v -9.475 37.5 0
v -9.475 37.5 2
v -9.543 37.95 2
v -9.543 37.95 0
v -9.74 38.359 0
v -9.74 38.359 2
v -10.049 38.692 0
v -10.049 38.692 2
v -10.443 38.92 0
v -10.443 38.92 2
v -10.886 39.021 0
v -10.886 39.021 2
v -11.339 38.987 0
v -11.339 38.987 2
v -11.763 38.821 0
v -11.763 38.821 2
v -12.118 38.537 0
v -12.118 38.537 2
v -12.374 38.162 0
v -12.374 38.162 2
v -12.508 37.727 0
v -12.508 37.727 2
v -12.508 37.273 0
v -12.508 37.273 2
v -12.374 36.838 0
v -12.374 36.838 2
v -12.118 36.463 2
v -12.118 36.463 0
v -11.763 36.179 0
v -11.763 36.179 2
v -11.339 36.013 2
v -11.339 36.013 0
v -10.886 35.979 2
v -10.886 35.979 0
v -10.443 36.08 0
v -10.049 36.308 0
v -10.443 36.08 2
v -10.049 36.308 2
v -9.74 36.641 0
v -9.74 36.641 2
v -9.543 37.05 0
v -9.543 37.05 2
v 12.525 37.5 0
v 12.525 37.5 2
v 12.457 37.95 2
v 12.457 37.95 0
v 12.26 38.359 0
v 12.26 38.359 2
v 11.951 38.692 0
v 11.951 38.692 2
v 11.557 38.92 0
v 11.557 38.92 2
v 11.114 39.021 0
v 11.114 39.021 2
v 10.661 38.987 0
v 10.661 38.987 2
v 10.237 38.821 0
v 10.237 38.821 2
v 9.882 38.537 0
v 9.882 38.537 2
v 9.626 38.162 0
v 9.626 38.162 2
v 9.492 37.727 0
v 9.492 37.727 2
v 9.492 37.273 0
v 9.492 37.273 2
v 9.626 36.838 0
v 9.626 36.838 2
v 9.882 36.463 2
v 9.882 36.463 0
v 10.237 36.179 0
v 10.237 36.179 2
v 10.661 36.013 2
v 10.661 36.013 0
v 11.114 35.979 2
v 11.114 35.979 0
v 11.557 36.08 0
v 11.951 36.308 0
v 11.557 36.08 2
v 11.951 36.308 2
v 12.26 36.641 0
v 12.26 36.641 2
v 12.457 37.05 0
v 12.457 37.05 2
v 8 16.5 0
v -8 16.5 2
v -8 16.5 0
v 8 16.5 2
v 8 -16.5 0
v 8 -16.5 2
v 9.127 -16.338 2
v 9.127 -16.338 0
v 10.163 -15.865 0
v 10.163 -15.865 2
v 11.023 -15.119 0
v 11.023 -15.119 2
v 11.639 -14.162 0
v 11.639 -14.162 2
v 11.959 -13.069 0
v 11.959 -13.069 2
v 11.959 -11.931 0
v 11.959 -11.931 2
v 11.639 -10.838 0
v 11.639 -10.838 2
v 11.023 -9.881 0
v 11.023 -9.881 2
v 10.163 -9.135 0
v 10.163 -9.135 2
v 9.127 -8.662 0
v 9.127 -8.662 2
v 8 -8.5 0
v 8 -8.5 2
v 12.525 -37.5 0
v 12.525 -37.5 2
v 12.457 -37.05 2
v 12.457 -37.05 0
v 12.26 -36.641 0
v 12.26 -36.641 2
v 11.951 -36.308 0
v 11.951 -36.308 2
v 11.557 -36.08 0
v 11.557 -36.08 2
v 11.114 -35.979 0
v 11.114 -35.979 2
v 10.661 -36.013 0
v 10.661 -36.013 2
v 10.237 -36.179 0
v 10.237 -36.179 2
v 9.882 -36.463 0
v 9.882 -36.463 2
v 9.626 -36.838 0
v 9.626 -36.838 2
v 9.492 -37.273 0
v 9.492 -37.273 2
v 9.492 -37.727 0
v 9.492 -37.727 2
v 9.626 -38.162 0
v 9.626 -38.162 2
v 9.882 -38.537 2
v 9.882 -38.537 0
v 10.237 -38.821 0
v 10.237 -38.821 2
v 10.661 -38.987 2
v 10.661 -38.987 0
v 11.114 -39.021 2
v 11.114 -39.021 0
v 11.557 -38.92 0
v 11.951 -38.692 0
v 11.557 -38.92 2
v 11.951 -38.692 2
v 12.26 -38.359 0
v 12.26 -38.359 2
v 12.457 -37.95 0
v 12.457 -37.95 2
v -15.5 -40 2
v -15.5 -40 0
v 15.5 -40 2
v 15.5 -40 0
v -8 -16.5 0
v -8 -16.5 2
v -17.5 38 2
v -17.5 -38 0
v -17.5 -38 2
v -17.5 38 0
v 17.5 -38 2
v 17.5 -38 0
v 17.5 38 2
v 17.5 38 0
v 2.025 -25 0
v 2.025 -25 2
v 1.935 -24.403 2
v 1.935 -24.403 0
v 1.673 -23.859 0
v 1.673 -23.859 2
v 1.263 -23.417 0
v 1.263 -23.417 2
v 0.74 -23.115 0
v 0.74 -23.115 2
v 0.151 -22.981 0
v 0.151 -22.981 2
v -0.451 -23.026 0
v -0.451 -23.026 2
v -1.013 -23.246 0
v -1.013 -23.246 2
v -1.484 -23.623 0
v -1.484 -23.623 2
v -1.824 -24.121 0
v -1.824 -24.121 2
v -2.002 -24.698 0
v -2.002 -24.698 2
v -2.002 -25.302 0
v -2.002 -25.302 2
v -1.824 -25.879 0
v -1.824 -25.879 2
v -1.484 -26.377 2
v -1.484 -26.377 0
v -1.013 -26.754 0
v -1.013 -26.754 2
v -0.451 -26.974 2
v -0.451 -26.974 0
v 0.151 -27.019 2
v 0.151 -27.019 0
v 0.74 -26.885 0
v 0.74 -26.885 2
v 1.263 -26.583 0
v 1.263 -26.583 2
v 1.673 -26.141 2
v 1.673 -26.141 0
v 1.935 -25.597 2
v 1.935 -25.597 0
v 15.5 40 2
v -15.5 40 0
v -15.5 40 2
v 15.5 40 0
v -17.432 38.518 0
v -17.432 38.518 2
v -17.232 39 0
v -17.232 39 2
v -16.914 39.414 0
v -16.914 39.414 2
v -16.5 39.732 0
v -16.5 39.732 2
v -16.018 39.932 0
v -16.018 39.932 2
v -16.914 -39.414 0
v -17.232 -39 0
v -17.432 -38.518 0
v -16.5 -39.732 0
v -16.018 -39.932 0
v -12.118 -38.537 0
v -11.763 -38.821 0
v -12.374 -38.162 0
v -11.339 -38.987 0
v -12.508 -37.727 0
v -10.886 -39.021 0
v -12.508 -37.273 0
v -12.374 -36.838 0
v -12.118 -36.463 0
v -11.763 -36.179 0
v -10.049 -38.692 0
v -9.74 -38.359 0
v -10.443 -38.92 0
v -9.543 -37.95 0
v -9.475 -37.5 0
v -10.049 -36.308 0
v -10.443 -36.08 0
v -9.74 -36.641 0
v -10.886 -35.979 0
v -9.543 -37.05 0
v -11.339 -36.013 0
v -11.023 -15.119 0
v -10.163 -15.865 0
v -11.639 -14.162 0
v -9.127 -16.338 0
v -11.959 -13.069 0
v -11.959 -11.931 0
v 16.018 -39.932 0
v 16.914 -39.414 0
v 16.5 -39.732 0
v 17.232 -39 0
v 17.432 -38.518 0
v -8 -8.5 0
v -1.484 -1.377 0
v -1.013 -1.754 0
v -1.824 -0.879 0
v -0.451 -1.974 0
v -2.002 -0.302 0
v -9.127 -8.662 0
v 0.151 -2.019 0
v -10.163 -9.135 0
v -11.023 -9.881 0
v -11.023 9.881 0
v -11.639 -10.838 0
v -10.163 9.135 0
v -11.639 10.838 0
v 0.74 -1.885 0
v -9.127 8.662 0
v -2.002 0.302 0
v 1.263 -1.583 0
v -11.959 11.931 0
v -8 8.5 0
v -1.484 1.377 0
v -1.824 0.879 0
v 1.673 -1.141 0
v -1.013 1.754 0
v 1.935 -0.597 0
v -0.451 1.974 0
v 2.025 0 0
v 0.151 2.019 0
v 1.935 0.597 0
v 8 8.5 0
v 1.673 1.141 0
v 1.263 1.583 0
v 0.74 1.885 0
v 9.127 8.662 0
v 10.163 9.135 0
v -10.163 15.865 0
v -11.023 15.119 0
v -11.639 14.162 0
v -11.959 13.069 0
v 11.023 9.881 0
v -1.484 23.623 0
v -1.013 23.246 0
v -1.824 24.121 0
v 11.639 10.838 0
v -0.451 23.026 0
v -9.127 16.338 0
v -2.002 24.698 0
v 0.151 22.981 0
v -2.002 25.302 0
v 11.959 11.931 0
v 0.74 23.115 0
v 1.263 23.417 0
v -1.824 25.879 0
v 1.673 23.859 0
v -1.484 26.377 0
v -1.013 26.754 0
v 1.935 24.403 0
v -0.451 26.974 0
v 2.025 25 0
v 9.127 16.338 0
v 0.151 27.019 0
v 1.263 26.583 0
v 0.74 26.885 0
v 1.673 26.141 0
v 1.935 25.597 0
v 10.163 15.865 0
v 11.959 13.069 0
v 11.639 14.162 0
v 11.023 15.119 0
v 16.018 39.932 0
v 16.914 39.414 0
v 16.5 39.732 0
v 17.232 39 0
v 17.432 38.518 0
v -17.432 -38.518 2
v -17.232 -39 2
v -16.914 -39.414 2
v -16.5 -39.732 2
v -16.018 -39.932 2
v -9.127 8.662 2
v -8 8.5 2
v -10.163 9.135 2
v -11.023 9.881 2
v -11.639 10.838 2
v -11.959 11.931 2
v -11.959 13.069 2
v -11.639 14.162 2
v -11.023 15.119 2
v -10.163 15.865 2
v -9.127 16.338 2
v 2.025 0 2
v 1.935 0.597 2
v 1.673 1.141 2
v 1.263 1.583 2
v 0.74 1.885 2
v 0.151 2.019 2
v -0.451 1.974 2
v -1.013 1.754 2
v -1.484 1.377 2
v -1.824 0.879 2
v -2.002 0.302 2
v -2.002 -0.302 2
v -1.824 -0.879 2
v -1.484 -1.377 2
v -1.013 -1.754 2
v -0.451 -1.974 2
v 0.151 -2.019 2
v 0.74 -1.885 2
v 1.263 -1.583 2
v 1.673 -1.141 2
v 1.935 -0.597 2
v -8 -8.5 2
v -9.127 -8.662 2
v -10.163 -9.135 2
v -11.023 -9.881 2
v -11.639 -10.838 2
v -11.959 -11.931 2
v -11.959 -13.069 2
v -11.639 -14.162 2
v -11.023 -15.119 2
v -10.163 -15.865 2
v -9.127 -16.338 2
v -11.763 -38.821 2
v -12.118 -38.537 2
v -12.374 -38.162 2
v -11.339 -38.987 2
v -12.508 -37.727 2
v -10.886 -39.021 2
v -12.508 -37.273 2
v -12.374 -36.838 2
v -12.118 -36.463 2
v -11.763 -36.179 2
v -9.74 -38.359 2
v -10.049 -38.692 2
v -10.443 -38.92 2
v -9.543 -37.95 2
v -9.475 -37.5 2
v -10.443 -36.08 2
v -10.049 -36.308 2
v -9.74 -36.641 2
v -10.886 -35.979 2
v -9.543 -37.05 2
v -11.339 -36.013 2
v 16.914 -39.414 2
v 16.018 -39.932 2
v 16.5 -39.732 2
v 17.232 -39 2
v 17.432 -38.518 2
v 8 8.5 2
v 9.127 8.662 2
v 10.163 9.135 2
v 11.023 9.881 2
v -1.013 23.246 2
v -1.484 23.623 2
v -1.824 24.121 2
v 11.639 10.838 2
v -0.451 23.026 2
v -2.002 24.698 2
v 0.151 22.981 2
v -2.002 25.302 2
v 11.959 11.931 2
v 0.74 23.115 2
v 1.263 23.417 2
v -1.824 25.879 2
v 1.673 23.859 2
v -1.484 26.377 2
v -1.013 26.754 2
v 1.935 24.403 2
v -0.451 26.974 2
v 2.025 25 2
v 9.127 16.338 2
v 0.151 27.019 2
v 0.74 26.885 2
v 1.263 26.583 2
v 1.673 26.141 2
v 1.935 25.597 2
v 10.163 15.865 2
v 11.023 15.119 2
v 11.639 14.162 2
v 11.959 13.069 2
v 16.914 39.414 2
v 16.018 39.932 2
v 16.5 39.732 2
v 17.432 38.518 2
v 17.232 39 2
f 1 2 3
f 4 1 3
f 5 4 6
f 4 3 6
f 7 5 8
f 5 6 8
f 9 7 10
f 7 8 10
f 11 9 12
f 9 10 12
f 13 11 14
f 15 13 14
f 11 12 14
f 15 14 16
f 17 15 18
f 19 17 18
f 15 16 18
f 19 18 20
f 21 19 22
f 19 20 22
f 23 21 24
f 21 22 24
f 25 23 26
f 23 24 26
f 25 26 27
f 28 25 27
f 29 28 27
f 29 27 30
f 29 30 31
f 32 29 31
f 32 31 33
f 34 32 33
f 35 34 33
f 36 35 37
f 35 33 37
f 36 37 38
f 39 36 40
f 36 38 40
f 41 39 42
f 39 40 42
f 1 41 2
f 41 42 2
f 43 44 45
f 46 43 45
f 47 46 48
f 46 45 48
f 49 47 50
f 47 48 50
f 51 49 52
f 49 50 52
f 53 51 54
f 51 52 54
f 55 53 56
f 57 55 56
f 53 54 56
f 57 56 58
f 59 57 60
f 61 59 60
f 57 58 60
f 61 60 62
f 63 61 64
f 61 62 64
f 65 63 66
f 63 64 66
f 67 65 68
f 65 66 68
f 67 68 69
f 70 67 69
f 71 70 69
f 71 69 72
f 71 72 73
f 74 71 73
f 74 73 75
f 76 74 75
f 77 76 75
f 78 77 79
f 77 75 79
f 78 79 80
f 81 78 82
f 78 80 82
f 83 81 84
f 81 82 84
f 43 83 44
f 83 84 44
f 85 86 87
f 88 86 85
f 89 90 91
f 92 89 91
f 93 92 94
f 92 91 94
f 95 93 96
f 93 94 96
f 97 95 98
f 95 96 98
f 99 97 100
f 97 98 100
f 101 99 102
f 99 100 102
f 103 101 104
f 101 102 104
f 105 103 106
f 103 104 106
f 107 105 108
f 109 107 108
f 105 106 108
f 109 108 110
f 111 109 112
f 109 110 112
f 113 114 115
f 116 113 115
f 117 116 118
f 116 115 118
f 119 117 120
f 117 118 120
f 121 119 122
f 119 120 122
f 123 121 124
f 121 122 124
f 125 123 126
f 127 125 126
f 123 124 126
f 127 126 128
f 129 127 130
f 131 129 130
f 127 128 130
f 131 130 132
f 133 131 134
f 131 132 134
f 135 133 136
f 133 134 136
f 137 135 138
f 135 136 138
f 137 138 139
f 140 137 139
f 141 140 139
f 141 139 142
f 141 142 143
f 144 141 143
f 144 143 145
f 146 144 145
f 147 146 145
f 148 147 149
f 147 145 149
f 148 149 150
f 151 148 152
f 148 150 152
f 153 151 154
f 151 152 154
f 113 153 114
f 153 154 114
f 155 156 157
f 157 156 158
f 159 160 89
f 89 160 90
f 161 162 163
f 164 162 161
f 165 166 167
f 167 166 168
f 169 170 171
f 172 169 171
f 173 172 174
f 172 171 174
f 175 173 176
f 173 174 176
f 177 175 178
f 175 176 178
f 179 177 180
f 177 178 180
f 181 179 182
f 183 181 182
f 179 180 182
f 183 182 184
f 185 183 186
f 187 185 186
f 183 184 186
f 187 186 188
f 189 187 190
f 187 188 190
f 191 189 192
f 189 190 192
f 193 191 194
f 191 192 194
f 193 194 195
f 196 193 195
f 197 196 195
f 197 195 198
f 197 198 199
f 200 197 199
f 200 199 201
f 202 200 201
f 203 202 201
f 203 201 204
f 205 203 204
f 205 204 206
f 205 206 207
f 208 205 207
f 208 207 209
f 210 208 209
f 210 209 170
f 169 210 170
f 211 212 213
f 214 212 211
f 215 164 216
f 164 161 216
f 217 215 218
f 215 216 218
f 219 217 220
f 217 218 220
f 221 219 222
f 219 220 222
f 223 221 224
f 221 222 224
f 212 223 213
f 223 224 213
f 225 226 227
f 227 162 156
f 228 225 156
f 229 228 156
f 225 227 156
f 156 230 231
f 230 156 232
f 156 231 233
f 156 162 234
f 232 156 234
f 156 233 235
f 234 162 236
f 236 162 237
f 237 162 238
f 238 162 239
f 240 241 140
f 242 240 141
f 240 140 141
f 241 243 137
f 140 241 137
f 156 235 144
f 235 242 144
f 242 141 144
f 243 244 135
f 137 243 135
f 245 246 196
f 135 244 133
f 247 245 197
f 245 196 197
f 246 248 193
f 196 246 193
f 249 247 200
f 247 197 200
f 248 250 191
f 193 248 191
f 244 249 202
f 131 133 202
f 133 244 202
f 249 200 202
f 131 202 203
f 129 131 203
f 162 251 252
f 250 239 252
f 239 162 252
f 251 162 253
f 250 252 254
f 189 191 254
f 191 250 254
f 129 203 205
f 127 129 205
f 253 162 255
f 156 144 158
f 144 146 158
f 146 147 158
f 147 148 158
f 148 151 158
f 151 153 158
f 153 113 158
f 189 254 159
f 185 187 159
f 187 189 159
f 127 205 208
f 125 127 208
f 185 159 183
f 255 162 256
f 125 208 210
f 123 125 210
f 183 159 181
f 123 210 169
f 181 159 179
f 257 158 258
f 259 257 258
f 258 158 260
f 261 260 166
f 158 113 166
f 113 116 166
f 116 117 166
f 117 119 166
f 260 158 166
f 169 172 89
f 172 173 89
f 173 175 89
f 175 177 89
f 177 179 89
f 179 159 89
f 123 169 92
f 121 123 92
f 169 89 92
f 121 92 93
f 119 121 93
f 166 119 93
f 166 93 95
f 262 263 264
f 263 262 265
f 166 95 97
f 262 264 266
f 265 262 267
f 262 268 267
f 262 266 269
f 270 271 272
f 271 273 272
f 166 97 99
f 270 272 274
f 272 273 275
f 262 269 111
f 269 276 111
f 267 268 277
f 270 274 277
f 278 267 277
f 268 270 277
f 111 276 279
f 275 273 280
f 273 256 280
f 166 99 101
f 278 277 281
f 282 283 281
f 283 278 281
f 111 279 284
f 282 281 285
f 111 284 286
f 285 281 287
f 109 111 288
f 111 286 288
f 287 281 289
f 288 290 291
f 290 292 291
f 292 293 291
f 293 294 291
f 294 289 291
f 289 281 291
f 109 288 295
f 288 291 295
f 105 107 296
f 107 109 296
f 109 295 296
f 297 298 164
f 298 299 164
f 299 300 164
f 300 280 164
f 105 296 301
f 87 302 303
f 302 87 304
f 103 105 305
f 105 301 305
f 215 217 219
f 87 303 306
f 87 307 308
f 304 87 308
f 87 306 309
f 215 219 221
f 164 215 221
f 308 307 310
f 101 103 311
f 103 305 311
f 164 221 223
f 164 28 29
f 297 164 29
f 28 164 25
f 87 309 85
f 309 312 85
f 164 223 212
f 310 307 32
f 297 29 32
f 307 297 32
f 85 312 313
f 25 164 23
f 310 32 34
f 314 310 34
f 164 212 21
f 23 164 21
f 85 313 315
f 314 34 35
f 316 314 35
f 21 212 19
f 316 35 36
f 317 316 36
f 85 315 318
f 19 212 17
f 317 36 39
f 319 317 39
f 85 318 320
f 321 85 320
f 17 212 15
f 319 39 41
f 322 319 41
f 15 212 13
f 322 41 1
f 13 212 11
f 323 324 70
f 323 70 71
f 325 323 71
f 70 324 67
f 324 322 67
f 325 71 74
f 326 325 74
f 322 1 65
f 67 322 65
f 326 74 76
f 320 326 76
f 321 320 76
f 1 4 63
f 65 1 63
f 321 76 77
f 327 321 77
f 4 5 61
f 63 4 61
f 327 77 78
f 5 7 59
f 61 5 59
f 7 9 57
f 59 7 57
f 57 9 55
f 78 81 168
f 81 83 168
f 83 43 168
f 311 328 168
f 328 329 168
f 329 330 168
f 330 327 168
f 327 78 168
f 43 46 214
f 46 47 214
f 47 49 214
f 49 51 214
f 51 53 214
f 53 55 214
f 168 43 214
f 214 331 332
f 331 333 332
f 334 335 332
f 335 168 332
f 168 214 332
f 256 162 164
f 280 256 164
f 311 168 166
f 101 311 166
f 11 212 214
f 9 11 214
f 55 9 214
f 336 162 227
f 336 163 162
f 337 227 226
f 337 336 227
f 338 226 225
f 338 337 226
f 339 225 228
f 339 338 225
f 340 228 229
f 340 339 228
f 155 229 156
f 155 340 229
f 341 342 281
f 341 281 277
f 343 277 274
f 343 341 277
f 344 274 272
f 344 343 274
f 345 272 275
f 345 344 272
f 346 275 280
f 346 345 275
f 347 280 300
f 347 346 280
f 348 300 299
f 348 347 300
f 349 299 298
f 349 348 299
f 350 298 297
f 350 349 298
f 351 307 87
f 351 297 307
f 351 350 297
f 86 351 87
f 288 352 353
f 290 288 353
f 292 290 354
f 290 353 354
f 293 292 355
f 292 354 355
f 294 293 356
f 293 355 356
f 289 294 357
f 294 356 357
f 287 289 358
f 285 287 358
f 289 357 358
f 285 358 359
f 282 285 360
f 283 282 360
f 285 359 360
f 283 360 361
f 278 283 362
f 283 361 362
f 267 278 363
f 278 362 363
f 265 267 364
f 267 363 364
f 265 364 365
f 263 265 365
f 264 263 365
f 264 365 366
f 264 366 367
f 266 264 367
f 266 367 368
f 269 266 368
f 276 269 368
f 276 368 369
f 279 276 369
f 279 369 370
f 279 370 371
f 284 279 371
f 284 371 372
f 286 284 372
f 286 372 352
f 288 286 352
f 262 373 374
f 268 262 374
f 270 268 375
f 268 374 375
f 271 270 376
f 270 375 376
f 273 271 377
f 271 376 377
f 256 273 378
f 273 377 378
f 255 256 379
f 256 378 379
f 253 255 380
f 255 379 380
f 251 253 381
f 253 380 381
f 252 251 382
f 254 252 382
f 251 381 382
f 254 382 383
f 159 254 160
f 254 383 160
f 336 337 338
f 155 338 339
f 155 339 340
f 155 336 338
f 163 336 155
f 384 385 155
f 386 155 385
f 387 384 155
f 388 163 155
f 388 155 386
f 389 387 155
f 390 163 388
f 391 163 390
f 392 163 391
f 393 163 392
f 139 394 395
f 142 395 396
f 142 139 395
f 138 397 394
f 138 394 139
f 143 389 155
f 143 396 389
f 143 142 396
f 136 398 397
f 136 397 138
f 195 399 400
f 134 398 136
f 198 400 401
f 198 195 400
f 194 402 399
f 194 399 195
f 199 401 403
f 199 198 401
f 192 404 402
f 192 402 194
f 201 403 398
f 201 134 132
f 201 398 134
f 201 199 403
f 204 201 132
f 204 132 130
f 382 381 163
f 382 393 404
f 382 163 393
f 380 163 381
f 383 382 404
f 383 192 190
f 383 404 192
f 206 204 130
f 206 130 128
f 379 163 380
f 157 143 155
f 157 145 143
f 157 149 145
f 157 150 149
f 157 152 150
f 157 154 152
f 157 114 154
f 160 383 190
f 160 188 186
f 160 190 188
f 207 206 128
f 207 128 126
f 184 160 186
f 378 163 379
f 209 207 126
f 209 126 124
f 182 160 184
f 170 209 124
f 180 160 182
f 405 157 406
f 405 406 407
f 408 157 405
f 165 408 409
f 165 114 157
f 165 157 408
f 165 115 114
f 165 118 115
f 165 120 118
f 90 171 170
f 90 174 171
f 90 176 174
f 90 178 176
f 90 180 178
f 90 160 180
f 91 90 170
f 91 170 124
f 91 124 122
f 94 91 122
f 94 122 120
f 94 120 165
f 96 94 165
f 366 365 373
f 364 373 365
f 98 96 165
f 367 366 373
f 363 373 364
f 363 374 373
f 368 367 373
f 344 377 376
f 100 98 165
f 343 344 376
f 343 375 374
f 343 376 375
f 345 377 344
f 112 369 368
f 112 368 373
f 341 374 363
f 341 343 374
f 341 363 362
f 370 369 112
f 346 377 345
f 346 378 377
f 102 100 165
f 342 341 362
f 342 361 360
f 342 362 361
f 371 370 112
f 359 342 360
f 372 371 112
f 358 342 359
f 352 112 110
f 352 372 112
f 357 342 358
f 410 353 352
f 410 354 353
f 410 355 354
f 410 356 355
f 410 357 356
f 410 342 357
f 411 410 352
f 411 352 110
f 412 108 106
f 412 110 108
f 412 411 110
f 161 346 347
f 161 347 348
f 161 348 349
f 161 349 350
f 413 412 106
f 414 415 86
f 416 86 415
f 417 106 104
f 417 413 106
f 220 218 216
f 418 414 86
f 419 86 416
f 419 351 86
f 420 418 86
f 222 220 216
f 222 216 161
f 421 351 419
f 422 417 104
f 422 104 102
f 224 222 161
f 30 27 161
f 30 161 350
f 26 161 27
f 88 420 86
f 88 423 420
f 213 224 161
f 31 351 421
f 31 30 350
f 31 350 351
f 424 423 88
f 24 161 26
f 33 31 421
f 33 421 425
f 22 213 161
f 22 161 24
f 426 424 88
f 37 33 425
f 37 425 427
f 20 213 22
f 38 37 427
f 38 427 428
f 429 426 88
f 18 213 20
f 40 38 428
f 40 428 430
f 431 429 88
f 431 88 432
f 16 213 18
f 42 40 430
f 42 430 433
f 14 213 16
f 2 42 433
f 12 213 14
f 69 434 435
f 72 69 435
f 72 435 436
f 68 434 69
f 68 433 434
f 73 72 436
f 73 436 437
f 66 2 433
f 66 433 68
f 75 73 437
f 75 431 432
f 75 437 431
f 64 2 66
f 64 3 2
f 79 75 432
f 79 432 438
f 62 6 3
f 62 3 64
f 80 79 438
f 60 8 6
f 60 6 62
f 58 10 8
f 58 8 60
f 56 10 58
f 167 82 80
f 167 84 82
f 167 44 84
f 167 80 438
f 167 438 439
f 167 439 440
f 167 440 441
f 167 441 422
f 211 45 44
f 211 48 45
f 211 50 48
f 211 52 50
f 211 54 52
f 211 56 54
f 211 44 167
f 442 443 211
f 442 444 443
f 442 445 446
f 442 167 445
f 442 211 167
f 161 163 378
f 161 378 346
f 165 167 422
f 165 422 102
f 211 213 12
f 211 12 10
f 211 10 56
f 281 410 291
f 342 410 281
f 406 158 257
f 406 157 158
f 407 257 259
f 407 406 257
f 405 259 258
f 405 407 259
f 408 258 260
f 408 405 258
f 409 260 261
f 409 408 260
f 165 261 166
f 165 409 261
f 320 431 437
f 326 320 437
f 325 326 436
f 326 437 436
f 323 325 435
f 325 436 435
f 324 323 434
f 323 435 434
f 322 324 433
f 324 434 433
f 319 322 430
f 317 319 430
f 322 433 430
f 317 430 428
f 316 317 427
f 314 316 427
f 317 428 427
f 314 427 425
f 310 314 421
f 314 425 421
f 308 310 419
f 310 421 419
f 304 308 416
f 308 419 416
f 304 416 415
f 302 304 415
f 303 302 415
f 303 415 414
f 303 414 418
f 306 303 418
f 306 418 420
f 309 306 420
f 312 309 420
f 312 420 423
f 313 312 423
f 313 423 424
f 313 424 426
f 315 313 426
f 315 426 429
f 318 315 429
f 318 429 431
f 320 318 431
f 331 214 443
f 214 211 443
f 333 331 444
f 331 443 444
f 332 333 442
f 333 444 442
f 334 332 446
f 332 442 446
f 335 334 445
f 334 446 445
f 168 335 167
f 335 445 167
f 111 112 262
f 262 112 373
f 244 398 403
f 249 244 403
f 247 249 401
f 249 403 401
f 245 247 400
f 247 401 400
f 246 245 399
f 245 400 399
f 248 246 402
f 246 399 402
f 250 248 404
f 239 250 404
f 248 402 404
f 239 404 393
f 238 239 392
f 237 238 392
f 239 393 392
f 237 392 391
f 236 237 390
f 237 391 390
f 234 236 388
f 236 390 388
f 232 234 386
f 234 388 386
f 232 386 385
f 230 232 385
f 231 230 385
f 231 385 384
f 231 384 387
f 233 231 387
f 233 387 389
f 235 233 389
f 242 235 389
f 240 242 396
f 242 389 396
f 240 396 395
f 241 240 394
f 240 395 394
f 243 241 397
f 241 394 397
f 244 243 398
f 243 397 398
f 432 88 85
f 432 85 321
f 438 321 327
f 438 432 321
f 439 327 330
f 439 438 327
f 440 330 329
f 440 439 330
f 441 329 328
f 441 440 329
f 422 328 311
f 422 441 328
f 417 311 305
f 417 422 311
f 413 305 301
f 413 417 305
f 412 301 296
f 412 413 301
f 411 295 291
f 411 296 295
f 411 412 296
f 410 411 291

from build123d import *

# Parameters (mm, degrees)
SKETCH_1_W               = 35
SKETCH_1_H               = 80
EXTRUDE_1_DEPTH          = 2
SKETCH_2_R               = 1.525
CUT_EXTRUDE_1_DEPTH      = 2
FILLET_1_R               = 2
SKETCH_3_R               = 2.025
CUT_EXTRUDE_2_DEPTH      = 10
CUT_EXTRUDE_3_DEPTH      = 1
CUT_EXTRUDE_3_DEPTH_BACK = 3


with BuildPart() as part:
    # 草图1 → 凸台-拉伸1 (new body)
    with BuildSketch(Plane.XY):
        Rectangle(SKETCH_1_W, SKETCH_1_H)
    extrude(amount=EXTRUDE_1_DEPTH)

    # 草图2 → 切除-拉伸1 (cut)
    with BuildSketch(Plane.XY.offset(2)):
        with Locations((11, 37.5)):
            Circle(SKETCH_2_R)
        with Locations((-11, 37.5)):
            Circle(SKETCH_2_R)
        with Locations((-11, -37.5)):
            Circle(SKETCH_2_R)
        with Locations((11, -37.5)):
            Circle(SKETCH_2_R)
    extrude(amount=-CUT_EXTRUDE_1_DEPTH, mode=Mode.SUBTRACT)

    # 圆角1
    fillet_1_edges = [part.edges().sort_by_distance(p)[0] for p in [
        (17.5, -40, 1),
        (-17.5, -40, 1),
        (-17.5, 40, 1),
        (17.5, 40, 1),
    ]]
    fillet(fillet_1_edges, radius=FILLET_1_R)

    # 草图3 → 切除-拉伸2 (cut)
    with BuildSketch(Plane.XY.offset(2)):
        with Locations((0, 25)):
            Circle(SKETCH_3_R)
        Circle(SKETCH_3_R)
        with Locations((0, -25)):
            Circle(SKETCH_3_R)
    extrude(amount=-CUT_EXTRUDE_2_DEPTH, mode=Mode.SUBTRACT)

    # 草图4 → 切除-拉伸3 (cut, two sides)
    with BuildSketch(Plane.XY.offset(2)) as cut_extrude_3_sk:
        with BuildLine():
            Line((-8, 16.5), (8, 16.5))
            ThreePointArc((8, 16.5), (12, 12.5), (8, 8.5))
            Line((8, 8.5), (-8, 8.5))
            ThreePointArc((-8, 8.5), (-12, 12.5), (-8, 16.5))
        make_face()
        with BuildLine():
            Line((-8, -16.5), (8, -16.5))
            ThreePointArc((8, -16.5), (12, -12.5), (8, -8.5))
            Line((8, -8.5), (-8, -8.5))
            ThreePointArc((-8, -8.5), (-12, -12.5), (-8, -16.5))
        make_face()
    extrude(amount=CUT_EXTRUDE_3_DEPTH, mode=Mode.SUBTRACT)
    extrude(cut_extrude_3_sk.sketch, amount=-CUT_EXTRUDE_3_DEPTH_BACK, mode=Mode.SUBTRACT)


solid = part.part
